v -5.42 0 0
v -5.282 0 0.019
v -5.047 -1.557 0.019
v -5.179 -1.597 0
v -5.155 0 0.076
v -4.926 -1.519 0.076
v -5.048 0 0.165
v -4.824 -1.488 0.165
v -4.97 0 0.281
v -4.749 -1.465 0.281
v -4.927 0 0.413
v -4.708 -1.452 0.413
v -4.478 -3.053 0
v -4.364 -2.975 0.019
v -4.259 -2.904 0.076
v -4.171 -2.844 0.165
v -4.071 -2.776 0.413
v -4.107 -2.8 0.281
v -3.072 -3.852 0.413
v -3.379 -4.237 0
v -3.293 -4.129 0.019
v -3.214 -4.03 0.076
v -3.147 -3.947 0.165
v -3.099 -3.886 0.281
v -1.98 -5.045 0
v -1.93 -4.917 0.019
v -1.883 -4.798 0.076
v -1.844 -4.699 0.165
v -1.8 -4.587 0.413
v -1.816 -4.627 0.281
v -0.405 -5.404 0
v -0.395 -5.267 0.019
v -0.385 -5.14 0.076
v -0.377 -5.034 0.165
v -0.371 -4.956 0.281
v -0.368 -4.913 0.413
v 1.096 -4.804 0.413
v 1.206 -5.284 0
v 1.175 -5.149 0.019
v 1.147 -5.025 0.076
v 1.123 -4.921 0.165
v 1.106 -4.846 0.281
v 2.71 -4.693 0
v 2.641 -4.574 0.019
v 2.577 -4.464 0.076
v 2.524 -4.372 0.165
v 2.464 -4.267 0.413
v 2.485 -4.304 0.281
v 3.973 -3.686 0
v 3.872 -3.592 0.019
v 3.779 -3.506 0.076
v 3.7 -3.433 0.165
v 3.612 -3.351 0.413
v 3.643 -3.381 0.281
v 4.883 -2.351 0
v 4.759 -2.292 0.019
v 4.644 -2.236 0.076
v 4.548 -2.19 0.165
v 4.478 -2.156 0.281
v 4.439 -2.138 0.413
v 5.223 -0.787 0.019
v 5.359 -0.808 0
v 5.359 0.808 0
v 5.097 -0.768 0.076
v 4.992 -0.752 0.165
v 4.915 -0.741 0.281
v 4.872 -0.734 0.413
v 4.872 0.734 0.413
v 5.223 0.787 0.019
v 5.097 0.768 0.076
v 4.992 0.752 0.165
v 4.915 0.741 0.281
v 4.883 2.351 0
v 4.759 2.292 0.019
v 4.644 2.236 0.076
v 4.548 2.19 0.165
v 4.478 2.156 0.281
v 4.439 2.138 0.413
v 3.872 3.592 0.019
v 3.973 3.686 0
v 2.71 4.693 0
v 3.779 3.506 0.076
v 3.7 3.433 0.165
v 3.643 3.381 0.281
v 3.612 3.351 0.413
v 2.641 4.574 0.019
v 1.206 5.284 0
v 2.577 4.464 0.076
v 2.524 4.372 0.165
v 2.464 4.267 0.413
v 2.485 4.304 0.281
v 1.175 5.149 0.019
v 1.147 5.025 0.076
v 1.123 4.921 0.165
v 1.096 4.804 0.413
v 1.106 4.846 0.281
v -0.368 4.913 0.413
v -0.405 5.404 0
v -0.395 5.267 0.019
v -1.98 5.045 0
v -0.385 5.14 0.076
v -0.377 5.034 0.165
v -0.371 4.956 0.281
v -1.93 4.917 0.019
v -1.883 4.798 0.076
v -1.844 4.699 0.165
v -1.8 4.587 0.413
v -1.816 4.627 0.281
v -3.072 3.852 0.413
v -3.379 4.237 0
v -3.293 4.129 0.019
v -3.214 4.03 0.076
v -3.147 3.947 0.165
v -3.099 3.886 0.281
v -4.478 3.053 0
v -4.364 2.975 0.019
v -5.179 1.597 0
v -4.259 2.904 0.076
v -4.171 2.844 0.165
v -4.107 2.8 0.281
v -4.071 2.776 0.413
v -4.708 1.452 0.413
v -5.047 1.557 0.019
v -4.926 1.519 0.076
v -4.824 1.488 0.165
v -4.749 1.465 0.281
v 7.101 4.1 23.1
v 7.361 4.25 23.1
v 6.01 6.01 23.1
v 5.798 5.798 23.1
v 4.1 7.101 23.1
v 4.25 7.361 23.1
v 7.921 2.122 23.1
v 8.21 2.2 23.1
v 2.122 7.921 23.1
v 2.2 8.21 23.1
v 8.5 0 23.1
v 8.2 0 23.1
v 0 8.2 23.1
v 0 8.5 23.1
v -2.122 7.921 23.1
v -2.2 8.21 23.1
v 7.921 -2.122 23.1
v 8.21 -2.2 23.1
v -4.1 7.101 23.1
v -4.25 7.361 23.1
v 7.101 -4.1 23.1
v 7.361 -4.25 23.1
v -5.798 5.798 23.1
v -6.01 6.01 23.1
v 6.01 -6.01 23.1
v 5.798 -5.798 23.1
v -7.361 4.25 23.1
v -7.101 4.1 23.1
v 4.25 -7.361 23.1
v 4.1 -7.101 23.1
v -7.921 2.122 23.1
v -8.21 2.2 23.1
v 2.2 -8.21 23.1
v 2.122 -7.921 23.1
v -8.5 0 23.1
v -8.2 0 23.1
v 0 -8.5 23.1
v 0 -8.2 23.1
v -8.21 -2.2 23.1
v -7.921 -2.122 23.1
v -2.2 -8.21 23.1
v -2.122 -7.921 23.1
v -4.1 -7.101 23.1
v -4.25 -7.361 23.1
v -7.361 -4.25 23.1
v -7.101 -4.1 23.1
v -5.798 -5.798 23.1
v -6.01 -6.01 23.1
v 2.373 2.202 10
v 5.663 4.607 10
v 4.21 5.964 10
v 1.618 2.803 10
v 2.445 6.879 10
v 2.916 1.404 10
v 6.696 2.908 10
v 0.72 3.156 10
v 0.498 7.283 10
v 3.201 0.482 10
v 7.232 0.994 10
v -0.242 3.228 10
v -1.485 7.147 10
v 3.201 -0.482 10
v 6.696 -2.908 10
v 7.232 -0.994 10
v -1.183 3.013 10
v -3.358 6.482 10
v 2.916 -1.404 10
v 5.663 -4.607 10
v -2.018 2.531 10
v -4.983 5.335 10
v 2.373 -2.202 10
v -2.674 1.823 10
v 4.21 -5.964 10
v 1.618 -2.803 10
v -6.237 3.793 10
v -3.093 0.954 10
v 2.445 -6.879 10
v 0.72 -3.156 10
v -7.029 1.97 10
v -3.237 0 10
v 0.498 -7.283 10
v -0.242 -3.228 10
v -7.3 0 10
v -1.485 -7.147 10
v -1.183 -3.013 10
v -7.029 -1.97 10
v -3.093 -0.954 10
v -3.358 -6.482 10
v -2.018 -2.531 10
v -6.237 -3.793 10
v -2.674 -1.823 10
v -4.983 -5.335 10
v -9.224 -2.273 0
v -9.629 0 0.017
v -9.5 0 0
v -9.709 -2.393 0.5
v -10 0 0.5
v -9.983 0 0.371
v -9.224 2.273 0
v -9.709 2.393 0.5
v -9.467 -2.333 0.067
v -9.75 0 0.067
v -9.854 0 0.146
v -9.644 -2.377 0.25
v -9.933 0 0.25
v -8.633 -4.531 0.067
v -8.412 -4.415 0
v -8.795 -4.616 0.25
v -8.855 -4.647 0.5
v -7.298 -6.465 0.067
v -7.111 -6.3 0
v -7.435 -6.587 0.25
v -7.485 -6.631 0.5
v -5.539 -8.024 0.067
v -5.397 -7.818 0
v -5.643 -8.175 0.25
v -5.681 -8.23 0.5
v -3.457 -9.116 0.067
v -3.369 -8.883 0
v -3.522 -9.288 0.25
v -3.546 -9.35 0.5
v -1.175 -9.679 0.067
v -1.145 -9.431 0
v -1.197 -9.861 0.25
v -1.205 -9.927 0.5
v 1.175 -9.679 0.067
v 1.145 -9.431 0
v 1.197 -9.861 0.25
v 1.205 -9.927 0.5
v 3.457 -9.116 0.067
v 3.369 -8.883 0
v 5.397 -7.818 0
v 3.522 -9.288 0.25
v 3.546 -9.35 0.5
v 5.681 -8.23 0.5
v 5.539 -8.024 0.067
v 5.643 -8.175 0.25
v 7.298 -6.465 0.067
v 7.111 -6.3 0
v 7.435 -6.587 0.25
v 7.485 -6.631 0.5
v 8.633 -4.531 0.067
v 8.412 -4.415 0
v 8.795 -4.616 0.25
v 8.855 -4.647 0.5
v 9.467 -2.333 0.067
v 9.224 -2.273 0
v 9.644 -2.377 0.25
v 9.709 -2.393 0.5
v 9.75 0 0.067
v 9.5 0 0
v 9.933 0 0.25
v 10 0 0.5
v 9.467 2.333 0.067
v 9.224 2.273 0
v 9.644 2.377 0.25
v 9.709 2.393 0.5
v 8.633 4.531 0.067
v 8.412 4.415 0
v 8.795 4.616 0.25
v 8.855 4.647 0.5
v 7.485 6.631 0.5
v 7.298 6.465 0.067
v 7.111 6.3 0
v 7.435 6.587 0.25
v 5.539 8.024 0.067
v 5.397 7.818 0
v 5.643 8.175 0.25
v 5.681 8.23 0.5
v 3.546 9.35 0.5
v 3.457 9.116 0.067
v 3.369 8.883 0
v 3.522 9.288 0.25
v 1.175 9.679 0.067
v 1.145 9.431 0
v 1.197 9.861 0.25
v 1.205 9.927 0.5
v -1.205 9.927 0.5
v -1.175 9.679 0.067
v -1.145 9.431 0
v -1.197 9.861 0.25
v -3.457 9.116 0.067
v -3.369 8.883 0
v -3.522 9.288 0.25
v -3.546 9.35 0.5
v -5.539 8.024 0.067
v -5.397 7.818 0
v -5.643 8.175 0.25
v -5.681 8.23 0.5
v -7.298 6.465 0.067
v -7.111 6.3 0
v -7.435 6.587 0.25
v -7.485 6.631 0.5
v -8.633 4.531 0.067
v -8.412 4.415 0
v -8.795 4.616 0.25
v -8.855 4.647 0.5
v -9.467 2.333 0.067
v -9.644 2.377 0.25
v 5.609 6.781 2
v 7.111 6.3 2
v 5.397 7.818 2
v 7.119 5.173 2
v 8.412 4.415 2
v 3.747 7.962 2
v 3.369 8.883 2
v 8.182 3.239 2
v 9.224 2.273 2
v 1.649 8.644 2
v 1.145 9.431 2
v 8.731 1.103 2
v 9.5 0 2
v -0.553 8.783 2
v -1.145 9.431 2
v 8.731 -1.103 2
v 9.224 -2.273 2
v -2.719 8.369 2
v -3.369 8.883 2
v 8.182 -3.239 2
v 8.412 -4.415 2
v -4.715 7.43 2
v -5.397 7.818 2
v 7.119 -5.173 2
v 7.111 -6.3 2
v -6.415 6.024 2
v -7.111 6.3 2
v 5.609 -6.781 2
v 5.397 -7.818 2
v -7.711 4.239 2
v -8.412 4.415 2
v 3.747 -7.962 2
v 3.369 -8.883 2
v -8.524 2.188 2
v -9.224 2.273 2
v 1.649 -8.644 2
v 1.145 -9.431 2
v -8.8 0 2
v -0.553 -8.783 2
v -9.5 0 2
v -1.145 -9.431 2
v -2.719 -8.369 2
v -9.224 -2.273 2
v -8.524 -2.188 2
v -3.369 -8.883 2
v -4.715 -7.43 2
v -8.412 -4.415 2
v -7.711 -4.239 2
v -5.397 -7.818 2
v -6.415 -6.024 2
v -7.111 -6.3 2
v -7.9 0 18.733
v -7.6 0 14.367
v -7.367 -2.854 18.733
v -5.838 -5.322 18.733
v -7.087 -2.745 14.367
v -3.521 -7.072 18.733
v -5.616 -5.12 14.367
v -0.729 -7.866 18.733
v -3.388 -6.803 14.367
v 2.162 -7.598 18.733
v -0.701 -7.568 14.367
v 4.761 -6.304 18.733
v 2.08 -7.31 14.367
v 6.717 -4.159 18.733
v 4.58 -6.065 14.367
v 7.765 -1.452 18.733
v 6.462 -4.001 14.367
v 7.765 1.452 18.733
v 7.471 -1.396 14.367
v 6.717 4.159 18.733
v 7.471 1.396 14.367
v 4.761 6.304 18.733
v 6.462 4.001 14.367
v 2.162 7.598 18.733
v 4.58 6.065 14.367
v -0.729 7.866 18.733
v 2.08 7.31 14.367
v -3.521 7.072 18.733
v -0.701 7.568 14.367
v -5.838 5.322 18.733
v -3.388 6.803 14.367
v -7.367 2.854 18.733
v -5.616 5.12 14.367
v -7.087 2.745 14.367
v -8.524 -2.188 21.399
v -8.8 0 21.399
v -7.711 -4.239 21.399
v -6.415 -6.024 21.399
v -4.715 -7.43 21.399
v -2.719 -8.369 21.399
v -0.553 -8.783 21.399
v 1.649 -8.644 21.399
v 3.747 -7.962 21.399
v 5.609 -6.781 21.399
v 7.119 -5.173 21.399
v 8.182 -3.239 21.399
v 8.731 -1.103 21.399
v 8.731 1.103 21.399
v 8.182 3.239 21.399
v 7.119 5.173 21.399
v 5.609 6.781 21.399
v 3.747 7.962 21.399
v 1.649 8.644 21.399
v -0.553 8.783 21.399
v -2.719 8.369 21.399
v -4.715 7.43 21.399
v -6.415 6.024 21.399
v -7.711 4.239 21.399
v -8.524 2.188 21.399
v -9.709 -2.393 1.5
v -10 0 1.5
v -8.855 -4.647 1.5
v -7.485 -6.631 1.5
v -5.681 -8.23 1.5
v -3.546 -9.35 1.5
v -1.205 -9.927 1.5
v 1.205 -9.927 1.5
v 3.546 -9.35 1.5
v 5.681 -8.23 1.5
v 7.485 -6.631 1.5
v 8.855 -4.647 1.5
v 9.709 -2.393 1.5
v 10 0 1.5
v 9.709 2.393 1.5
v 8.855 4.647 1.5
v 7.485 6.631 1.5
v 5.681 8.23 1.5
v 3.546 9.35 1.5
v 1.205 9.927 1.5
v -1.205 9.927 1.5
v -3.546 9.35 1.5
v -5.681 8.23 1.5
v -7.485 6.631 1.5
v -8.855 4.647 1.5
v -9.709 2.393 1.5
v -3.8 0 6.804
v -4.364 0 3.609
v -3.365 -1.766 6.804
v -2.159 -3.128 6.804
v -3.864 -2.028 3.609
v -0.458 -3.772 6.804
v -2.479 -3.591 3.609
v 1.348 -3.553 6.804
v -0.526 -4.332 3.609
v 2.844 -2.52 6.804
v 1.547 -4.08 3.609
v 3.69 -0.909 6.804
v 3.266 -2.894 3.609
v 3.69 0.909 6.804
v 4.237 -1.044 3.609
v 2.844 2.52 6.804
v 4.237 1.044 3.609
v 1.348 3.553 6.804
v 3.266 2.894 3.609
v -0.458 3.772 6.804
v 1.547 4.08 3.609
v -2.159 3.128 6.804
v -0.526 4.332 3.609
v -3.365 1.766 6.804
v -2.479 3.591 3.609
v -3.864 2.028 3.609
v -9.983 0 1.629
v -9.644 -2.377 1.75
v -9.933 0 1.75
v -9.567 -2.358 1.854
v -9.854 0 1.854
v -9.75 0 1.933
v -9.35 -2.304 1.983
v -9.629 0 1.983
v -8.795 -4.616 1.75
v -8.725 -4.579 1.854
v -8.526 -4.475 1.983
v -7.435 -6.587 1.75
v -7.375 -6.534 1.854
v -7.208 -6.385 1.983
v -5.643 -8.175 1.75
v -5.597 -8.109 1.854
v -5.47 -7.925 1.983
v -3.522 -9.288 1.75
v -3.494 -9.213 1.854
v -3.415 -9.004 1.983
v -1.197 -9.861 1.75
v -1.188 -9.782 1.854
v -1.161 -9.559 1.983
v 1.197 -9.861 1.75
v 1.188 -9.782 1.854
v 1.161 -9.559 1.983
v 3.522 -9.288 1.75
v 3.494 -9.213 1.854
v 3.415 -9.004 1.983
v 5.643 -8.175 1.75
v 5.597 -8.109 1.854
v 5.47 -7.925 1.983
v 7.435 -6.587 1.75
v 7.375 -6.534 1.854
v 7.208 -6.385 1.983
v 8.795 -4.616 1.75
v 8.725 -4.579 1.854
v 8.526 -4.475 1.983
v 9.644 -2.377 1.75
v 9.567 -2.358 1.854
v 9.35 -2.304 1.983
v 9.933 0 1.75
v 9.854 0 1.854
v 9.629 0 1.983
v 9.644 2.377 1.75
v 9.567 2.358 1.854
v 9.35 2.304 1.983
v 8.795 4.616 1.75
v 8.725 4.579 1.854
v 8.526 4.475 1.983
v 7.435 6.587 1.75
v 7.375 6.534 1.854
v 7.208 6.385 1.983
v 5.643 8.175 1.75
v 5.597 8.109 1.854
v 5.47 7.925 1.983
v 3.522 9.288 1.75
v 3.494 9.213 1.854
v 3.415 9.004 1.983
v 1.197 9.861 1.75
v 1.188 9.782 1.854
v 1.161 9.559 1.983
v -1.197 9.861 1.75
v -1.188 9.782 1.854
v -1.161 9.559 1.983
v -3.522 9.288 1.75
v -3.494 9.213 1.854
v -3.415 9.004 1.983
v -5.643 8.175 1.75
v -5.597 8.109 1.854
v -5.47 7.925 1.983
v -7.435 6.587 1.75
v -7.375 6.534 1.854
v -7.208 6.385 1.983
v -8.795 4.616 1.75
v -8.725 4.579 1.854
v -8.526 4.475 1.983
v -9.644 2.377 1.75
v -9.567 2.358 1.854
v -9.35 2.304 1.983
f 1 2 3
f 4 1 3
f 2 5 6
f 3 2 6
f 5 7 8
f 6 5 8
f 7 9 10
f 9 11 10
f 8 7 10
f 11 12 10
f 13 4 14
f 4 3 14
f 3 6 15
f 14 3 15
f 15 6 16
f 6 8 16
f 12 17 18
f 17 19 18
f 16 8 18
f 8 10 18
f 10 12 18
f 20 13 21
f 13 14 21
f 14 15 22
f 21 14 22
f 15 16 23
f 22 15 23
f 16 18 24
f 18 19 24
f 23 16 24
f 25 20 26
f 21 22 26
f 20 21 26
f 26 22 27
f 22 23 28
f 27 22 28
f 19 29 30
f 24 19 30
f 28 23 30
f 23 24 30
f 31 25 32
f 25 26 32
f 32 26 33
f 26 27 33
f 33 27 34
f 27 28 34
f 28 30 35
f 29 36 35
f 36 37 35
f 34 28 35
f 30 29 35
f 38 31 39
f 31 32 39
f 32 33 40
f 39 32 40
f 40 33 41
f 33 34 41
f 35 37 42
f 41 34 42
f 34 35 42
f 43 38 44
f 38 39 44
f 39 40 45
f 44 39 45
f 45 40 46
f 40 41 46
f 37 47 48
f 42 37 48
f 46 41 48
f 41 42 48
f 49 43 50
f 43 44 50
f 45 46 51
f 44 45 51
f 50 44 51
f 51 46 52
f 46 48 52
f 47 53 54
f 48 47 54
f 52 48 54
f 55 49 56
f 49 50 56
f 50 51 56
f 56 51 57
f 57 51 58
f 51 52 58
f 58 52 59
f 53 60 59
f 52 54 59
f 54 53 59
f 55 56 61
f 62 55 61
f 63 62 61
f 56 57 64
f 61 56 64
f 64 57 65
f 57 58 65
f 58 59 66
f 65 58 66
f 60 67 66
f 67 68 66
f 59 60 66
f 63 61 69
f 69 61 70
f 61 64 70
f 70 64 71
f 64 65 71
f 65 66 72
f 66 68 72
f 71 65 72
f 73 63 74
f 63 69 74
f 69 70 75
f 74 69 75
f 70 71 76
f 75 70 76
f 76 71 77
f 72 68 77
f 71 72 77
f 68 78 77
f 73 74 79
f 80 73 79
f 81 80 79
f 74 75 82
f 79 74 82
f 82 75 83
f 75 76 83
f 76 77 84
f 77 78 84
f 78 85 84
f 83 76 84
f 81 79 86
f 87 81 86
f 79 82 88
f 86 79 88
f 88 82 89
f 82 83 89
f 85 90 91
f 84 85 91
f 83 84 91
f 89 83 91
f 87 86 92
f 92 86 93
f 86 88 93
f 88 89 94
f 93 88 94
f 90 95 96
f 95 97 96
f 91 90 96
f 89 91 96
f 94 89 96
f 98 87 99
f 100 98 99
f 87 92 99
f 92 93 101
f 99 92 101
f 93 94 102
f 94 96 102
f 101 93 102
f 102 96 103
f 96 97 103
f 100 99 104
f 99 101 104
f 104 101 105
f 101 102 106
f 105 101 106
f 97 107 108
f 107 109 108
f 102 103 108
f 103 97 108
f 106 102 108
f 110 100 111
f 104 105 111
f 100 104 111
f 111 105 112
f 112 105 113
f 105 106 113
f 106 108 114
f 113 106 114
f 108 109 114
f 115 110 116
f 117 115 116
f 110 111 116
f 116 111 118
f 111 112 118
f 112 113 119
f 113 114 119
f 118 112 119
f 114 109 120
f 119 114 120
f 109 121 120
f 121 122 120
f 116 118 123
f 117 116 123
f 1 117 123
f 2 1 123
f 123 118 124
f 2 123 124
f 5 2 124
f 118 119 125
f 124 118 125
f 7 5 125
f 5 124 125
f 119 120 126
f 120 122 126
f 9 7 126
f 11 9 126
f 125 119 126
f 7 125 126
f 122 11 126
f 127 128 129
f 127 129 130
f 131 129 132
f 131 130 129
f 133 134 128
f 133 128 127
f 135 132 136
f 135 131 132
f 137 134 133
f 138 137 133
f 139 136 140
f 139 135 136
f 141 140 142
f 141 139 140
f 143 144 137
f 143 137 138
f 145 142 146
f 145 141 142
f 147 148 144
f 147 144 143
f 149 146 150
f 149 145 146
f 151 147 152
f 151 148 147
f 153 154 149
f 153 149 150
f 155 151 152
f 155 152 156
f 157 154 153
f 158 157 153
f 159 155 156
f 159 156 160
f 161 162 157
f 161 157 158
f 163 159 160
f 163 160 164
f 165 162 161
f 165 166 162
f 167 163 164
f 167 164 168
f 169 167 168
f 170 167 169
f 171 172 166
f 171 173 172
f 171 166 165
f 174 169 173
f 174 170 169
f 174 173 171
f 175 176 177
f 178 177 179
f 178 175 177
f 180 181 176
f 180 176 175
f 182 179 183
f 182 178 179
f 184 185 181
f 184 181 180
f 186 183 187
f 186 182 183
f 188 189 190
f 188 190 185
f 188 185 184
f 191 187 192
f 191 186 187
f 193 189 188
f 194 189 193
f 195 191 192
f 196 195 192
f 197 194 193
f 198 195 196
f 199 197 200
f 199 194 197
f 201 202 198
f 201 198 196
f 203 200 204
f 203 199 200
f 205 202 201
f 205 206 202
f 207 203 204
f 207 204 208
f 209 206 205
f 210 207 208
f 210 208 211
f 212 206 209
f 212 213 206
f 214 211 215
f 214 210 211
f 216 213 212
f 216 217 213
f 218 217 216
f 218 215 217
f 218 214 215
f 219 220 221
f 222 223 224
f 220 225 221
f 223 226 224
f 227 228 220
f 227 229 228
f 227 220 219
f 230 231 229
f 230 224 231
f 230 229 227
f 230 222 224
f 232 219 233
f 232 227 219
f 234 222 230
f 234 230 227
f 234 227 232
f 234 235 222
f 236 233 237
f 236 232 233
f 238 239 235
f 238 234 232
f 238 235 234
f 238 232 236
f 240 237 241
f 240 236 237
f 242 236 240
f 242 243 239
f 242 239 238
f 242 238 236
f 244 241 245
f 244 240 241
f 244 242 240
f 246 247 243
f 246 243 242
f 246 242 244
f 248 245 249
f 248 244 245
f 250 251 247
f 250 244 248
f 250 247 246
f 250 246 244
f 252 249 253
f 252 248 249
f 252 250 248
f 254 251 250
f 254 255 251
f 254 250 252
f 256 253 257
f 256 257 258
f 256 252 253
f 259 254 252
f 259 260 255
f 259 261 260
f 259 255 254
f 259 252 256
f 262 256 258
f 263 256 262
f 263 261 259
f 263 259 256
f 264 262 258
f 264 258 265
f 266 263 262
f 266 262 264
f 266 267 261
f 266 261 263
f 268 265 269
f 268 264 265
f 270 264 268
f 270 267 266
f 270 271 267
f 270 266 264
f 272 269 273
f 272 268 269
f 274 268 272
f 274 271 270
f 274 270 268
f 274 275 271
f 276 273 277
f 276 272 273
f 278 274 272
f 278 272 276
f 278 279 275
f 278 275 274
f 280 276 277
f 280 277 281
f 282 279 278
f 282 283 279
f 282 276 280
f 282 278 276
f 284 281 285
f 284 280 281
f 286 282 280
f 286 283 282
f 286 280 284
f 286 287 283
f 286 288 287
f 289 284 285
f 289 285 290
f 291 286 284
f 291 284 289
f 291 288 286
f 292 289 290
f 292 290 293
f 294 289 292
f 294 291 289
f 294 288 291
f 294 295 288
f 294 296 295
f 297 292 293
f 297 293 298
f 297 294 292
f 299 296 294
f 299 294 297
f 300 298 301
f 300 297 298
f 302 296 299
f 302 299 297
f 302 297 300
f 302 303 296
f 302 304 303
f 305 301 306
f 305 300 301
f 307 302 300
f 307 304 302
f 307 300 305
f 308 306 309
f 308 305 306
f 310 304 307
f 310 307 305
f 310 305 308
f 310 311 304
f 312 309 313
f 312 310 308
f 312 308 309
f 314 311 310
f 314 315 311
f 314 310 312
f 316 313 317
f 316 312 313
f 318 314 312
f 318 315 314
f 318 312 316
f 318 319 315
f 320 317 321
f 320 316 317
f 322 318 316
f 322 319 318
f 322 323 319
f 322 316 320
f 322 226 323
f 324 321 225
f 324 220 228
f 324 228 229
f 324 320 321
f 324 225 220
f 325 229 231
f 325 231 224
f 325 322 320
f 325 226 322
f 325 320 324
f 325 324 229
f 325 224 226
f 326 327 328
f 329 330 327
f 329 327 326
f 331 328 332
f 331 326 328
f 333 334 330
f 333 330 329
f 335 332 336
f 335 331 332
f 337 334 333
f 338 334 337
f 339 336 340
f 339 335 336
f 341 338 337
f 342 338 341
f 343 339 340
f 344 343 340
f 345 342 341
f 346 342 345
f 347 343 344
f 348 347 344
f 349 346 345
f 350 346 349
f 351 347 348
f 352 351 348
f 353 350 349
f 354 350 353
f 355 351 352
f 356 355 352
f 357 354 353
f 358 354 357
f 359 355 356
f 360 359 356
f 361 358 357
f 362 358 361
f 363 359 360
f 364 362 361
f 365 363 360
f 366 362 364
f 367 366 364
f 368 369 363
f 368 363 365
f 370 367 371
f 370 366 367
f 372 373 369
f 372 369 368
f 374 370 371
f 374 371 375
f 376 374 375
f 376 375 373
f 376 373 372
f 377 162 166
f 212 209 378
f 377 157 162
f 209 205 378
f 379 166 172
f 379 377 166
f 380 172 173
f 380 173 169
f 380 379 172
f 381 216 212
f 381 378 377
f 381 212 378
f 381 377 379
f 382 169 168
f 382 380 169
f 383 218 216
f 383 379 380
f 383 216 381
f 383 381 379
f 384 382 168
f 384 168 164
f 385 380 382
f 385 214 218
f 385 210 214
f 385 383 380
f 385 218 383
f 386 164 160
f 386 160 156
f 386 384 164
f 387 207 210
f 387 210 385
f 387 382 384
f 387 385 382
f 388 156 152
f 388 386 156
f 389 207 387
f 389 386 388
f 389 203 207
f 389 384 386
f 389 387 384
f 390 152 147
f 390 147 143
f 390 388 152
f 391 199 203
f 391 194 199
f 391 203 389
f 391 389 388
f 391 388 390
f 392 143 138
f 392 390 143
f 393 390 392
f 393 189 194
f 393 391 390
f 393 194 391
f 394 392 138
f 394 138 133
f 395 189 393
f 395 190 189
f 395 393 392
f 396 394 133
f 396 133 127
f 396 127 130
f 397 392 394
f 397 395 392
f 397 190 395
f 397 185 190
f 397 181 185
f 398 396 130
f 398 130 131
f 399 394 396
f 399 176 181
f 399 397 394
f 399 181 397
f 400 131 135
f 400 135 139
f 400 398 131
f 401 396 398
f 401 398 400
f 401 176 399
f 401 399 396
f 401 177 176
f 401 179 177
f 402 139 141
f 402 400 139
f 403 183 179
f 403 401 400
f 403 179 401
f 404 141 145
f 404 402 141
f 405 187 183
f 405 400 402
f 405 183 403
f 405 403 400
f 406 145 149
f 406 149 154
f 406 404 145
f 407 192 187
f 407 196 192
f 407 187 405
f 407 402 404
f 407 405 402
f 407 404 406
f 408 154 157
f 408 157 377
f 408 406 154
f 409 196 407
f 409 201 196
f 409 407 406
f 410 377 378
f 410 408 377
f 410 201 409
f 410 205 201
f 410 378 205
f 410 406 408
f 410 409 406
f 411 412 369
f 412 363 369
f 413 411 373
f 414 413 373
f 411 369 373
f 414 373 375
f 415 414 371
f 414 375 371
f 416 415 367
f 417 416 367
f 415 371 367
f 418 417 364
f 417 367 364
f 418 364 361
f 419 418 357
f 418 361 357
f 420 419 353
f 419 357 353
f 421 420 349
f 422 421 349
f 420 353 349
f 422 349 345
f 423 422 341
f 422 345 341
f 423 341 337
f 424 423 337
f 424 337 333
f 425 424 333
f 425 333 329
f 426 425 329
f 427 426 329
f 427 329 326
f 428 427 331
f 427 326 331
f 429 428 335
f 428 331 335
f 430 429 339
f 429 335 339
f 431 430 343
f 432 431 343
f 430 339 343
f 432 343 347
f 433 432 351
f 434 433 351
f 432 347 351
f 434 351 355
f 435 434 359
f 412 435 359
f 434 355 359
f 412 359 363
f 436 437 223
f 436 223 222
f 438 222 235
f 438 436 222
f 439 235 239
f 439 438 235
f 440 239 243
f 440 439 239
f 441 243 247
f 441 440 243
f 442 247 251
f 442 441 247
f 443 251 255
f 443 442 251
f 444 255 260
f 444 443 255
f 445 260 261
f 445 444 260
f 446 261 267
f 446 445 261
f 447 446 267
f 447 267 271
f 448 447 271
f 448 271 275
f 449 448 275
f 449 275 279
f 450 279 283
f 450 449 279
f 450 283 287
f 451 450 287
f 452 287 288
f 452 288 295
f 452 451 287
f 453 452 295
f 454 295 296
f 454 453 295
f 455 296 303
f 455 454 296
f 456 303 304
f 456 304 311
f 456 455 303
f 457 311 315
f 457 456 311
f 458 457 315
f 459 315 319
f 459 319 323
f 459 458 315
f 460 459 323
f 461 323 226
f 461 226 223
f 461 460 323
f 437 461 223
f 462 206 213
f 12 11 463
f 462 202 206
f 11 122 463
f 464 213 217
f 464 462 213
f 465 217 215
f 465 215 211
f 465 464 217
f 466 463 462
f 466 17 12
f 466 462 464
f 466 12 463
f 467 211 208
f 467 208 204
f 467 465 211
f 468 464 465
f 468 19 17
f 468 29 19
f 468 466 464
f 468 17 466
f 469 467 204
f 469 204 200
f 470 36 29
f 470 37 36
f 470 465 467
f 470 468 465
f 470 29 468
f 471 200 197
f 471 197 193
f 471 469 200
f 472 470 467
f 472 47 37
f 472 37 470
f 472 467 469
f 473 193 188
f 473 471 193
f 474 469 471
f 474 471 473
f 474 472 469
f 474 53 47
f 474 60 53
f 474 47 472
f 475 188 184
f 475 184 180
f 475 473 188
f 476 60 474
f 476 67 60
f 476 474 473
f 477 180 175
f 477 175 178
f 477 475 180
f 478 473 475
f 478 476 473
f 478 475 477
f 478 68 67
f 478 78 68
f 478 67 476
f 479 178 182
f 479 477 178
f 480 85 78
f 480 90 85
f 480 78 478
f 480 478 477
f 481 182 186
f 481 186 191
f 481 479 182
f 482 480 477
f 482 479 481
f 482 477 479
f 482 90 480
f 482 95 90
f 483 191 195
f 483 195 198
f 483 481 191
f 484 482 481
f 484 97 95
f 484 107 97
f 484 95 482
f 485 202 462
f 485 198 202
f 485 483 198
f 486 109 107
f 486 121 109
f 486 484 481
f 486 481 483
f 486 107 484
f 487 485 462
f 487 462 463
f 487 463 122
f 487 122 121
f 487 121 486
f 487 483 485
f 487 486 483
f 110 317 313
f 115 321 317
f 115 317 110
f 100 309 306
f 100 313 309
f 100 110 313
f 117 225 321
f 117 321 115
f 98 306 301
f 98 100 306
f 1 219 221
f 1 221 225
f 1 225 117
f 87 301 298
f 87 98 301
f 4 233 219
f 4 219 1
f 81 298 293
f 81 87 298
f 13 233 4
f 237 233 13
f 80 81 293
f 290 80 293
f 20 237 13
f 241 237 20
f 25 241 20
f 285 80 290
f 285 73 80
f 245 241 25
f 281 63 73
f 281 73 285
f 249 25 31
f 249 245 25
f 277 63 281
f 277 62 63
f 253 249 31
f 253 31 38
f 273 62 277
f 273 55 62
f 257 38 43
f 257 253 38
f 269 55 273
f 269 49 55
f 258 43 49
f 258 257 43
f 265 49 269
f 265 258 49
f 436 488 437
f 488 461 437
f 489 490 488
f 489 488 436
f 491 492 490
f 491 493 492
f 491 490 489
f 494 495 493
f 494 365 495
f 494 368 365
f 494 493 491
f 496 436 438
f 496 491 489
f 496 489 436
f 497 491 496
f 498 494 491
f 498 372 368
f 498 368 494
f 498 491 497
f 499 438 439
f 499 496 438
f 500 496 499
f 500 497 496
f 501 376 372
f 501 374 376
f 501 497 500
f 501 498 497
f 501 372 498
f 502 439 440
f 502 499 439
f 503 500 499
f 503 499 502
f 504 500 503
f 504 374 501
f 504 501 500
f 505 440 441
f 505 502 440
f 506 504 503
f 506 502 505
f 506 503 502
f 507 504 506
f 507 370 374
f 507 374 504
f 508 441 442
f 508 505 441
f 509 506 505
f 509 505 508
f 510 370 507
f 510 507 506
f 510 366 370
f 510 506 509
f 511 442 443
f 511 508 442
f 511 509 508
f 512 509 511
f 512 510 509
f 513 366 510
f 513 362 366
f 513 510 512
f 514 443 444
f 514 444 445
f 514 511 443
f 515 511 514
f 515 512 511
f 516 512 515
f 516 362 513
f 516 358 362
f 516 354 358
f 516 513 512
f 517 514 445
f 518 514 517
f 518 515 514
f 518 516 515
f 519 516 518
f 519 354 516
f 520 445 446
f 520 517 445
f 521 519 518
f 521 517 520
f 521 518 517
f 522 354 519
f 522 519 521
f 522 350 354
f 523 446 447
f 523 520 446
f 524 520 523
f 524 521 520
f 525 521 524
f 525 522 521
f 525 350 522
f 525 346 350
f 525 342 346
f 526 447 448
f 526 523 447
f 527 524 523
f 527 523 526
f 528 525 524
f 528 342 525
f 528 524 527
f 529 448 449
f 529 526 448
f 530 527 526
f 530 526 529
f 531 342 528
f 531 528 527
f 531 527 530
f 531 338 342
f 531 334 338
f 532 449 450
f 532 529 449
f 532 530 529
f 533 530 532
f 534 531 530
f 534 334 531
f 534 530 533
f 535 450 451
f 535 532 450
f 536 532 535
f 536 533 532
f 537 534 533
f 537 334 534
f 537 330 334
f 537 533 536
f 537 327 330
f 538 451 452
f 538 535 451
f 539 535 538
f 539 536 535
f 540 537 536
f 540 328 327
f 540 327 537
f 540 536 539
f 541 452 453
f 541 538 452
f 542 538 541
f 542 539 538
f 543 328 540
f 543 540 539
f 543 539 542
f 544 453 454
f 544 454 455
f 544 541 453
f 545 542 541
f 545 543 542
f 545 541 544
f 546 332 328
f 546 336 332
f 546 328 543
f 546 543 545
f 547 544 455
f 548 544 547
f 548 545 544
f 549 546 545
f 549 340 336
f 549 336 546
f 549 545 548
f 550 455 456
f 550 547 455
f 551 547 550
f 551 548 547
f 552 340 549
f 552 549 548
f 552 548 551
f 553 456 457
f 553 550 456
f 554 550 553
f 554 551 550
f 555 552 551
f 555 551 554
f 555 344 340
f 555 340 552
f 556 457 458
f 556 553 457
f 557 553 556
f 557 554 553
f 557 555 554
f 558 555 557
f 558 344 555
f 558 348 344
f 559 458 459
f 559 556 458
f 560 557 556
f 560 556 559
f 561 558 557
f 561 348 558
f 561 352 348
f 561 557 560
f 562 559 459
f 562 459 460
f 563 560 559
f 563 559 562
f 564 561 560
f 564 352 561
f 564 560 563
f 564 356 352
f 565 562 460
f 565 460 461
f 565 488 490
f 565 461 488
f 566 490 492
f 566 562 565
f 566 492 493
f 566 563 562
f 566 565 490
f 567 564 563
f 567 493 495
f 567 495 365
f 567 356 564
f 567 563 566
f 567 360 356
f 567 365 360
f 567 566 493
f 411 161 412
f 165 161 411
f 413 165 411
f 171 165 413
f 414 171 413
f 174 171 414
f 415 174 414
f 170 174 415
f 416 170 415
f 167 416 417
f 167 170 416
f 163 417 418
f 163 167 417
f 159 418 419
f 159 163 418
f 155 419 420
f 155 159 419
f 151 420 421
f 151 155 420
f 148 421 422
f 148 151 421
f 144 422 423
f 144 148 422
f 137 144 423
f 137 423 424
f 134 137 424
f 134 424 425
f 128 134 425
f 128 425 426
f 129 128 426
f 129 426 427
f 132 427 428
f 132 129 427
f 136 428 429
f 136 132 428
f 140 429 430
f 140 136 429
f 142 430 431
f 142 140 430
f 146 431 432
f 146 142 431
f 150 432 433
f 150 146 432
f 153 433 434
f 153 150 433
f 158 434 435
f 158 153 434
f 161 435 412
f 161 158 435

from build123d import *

# Parameters (mm, degrees)
FILLET1_R = 0.5


with BuildPart() as part:
    # Sketch1 → Revolve1 (revolve)
    with BuildSketch(Plane(origin=(0, 0, 0), x_dir=(1, 0, 0), z_dir=(0, 1, 0)), mode=Mode.PRIVATE) as revolve1_sk:
        Polygon((5, 0), (10, 0), (10, -2), (8.8, -2), (8.8, -10), (8.8, -21.398615454), (8.5, -23.1), (8.2, -23.1), (7.3, -10), (3.236730193, -10), align=None)
    revolve(revolve1_sk.sketch.rotate(Axis((0, 0, 0), (0, 0, 1)), 180), axis=Axis((0, 0, 0), (0, 0, 1)))  # turned: the seam where the file's is

    # Fillet1
    fillet1_edges = [part.edges().sort_by_distance(p)[0] for p in [
        (10, 0, 2),
        (10, 0, 0),
        (5, 0, 0),
    ]]
    fillet(fillet1_edges, radius=FILLET1_R)


solid = part.part
